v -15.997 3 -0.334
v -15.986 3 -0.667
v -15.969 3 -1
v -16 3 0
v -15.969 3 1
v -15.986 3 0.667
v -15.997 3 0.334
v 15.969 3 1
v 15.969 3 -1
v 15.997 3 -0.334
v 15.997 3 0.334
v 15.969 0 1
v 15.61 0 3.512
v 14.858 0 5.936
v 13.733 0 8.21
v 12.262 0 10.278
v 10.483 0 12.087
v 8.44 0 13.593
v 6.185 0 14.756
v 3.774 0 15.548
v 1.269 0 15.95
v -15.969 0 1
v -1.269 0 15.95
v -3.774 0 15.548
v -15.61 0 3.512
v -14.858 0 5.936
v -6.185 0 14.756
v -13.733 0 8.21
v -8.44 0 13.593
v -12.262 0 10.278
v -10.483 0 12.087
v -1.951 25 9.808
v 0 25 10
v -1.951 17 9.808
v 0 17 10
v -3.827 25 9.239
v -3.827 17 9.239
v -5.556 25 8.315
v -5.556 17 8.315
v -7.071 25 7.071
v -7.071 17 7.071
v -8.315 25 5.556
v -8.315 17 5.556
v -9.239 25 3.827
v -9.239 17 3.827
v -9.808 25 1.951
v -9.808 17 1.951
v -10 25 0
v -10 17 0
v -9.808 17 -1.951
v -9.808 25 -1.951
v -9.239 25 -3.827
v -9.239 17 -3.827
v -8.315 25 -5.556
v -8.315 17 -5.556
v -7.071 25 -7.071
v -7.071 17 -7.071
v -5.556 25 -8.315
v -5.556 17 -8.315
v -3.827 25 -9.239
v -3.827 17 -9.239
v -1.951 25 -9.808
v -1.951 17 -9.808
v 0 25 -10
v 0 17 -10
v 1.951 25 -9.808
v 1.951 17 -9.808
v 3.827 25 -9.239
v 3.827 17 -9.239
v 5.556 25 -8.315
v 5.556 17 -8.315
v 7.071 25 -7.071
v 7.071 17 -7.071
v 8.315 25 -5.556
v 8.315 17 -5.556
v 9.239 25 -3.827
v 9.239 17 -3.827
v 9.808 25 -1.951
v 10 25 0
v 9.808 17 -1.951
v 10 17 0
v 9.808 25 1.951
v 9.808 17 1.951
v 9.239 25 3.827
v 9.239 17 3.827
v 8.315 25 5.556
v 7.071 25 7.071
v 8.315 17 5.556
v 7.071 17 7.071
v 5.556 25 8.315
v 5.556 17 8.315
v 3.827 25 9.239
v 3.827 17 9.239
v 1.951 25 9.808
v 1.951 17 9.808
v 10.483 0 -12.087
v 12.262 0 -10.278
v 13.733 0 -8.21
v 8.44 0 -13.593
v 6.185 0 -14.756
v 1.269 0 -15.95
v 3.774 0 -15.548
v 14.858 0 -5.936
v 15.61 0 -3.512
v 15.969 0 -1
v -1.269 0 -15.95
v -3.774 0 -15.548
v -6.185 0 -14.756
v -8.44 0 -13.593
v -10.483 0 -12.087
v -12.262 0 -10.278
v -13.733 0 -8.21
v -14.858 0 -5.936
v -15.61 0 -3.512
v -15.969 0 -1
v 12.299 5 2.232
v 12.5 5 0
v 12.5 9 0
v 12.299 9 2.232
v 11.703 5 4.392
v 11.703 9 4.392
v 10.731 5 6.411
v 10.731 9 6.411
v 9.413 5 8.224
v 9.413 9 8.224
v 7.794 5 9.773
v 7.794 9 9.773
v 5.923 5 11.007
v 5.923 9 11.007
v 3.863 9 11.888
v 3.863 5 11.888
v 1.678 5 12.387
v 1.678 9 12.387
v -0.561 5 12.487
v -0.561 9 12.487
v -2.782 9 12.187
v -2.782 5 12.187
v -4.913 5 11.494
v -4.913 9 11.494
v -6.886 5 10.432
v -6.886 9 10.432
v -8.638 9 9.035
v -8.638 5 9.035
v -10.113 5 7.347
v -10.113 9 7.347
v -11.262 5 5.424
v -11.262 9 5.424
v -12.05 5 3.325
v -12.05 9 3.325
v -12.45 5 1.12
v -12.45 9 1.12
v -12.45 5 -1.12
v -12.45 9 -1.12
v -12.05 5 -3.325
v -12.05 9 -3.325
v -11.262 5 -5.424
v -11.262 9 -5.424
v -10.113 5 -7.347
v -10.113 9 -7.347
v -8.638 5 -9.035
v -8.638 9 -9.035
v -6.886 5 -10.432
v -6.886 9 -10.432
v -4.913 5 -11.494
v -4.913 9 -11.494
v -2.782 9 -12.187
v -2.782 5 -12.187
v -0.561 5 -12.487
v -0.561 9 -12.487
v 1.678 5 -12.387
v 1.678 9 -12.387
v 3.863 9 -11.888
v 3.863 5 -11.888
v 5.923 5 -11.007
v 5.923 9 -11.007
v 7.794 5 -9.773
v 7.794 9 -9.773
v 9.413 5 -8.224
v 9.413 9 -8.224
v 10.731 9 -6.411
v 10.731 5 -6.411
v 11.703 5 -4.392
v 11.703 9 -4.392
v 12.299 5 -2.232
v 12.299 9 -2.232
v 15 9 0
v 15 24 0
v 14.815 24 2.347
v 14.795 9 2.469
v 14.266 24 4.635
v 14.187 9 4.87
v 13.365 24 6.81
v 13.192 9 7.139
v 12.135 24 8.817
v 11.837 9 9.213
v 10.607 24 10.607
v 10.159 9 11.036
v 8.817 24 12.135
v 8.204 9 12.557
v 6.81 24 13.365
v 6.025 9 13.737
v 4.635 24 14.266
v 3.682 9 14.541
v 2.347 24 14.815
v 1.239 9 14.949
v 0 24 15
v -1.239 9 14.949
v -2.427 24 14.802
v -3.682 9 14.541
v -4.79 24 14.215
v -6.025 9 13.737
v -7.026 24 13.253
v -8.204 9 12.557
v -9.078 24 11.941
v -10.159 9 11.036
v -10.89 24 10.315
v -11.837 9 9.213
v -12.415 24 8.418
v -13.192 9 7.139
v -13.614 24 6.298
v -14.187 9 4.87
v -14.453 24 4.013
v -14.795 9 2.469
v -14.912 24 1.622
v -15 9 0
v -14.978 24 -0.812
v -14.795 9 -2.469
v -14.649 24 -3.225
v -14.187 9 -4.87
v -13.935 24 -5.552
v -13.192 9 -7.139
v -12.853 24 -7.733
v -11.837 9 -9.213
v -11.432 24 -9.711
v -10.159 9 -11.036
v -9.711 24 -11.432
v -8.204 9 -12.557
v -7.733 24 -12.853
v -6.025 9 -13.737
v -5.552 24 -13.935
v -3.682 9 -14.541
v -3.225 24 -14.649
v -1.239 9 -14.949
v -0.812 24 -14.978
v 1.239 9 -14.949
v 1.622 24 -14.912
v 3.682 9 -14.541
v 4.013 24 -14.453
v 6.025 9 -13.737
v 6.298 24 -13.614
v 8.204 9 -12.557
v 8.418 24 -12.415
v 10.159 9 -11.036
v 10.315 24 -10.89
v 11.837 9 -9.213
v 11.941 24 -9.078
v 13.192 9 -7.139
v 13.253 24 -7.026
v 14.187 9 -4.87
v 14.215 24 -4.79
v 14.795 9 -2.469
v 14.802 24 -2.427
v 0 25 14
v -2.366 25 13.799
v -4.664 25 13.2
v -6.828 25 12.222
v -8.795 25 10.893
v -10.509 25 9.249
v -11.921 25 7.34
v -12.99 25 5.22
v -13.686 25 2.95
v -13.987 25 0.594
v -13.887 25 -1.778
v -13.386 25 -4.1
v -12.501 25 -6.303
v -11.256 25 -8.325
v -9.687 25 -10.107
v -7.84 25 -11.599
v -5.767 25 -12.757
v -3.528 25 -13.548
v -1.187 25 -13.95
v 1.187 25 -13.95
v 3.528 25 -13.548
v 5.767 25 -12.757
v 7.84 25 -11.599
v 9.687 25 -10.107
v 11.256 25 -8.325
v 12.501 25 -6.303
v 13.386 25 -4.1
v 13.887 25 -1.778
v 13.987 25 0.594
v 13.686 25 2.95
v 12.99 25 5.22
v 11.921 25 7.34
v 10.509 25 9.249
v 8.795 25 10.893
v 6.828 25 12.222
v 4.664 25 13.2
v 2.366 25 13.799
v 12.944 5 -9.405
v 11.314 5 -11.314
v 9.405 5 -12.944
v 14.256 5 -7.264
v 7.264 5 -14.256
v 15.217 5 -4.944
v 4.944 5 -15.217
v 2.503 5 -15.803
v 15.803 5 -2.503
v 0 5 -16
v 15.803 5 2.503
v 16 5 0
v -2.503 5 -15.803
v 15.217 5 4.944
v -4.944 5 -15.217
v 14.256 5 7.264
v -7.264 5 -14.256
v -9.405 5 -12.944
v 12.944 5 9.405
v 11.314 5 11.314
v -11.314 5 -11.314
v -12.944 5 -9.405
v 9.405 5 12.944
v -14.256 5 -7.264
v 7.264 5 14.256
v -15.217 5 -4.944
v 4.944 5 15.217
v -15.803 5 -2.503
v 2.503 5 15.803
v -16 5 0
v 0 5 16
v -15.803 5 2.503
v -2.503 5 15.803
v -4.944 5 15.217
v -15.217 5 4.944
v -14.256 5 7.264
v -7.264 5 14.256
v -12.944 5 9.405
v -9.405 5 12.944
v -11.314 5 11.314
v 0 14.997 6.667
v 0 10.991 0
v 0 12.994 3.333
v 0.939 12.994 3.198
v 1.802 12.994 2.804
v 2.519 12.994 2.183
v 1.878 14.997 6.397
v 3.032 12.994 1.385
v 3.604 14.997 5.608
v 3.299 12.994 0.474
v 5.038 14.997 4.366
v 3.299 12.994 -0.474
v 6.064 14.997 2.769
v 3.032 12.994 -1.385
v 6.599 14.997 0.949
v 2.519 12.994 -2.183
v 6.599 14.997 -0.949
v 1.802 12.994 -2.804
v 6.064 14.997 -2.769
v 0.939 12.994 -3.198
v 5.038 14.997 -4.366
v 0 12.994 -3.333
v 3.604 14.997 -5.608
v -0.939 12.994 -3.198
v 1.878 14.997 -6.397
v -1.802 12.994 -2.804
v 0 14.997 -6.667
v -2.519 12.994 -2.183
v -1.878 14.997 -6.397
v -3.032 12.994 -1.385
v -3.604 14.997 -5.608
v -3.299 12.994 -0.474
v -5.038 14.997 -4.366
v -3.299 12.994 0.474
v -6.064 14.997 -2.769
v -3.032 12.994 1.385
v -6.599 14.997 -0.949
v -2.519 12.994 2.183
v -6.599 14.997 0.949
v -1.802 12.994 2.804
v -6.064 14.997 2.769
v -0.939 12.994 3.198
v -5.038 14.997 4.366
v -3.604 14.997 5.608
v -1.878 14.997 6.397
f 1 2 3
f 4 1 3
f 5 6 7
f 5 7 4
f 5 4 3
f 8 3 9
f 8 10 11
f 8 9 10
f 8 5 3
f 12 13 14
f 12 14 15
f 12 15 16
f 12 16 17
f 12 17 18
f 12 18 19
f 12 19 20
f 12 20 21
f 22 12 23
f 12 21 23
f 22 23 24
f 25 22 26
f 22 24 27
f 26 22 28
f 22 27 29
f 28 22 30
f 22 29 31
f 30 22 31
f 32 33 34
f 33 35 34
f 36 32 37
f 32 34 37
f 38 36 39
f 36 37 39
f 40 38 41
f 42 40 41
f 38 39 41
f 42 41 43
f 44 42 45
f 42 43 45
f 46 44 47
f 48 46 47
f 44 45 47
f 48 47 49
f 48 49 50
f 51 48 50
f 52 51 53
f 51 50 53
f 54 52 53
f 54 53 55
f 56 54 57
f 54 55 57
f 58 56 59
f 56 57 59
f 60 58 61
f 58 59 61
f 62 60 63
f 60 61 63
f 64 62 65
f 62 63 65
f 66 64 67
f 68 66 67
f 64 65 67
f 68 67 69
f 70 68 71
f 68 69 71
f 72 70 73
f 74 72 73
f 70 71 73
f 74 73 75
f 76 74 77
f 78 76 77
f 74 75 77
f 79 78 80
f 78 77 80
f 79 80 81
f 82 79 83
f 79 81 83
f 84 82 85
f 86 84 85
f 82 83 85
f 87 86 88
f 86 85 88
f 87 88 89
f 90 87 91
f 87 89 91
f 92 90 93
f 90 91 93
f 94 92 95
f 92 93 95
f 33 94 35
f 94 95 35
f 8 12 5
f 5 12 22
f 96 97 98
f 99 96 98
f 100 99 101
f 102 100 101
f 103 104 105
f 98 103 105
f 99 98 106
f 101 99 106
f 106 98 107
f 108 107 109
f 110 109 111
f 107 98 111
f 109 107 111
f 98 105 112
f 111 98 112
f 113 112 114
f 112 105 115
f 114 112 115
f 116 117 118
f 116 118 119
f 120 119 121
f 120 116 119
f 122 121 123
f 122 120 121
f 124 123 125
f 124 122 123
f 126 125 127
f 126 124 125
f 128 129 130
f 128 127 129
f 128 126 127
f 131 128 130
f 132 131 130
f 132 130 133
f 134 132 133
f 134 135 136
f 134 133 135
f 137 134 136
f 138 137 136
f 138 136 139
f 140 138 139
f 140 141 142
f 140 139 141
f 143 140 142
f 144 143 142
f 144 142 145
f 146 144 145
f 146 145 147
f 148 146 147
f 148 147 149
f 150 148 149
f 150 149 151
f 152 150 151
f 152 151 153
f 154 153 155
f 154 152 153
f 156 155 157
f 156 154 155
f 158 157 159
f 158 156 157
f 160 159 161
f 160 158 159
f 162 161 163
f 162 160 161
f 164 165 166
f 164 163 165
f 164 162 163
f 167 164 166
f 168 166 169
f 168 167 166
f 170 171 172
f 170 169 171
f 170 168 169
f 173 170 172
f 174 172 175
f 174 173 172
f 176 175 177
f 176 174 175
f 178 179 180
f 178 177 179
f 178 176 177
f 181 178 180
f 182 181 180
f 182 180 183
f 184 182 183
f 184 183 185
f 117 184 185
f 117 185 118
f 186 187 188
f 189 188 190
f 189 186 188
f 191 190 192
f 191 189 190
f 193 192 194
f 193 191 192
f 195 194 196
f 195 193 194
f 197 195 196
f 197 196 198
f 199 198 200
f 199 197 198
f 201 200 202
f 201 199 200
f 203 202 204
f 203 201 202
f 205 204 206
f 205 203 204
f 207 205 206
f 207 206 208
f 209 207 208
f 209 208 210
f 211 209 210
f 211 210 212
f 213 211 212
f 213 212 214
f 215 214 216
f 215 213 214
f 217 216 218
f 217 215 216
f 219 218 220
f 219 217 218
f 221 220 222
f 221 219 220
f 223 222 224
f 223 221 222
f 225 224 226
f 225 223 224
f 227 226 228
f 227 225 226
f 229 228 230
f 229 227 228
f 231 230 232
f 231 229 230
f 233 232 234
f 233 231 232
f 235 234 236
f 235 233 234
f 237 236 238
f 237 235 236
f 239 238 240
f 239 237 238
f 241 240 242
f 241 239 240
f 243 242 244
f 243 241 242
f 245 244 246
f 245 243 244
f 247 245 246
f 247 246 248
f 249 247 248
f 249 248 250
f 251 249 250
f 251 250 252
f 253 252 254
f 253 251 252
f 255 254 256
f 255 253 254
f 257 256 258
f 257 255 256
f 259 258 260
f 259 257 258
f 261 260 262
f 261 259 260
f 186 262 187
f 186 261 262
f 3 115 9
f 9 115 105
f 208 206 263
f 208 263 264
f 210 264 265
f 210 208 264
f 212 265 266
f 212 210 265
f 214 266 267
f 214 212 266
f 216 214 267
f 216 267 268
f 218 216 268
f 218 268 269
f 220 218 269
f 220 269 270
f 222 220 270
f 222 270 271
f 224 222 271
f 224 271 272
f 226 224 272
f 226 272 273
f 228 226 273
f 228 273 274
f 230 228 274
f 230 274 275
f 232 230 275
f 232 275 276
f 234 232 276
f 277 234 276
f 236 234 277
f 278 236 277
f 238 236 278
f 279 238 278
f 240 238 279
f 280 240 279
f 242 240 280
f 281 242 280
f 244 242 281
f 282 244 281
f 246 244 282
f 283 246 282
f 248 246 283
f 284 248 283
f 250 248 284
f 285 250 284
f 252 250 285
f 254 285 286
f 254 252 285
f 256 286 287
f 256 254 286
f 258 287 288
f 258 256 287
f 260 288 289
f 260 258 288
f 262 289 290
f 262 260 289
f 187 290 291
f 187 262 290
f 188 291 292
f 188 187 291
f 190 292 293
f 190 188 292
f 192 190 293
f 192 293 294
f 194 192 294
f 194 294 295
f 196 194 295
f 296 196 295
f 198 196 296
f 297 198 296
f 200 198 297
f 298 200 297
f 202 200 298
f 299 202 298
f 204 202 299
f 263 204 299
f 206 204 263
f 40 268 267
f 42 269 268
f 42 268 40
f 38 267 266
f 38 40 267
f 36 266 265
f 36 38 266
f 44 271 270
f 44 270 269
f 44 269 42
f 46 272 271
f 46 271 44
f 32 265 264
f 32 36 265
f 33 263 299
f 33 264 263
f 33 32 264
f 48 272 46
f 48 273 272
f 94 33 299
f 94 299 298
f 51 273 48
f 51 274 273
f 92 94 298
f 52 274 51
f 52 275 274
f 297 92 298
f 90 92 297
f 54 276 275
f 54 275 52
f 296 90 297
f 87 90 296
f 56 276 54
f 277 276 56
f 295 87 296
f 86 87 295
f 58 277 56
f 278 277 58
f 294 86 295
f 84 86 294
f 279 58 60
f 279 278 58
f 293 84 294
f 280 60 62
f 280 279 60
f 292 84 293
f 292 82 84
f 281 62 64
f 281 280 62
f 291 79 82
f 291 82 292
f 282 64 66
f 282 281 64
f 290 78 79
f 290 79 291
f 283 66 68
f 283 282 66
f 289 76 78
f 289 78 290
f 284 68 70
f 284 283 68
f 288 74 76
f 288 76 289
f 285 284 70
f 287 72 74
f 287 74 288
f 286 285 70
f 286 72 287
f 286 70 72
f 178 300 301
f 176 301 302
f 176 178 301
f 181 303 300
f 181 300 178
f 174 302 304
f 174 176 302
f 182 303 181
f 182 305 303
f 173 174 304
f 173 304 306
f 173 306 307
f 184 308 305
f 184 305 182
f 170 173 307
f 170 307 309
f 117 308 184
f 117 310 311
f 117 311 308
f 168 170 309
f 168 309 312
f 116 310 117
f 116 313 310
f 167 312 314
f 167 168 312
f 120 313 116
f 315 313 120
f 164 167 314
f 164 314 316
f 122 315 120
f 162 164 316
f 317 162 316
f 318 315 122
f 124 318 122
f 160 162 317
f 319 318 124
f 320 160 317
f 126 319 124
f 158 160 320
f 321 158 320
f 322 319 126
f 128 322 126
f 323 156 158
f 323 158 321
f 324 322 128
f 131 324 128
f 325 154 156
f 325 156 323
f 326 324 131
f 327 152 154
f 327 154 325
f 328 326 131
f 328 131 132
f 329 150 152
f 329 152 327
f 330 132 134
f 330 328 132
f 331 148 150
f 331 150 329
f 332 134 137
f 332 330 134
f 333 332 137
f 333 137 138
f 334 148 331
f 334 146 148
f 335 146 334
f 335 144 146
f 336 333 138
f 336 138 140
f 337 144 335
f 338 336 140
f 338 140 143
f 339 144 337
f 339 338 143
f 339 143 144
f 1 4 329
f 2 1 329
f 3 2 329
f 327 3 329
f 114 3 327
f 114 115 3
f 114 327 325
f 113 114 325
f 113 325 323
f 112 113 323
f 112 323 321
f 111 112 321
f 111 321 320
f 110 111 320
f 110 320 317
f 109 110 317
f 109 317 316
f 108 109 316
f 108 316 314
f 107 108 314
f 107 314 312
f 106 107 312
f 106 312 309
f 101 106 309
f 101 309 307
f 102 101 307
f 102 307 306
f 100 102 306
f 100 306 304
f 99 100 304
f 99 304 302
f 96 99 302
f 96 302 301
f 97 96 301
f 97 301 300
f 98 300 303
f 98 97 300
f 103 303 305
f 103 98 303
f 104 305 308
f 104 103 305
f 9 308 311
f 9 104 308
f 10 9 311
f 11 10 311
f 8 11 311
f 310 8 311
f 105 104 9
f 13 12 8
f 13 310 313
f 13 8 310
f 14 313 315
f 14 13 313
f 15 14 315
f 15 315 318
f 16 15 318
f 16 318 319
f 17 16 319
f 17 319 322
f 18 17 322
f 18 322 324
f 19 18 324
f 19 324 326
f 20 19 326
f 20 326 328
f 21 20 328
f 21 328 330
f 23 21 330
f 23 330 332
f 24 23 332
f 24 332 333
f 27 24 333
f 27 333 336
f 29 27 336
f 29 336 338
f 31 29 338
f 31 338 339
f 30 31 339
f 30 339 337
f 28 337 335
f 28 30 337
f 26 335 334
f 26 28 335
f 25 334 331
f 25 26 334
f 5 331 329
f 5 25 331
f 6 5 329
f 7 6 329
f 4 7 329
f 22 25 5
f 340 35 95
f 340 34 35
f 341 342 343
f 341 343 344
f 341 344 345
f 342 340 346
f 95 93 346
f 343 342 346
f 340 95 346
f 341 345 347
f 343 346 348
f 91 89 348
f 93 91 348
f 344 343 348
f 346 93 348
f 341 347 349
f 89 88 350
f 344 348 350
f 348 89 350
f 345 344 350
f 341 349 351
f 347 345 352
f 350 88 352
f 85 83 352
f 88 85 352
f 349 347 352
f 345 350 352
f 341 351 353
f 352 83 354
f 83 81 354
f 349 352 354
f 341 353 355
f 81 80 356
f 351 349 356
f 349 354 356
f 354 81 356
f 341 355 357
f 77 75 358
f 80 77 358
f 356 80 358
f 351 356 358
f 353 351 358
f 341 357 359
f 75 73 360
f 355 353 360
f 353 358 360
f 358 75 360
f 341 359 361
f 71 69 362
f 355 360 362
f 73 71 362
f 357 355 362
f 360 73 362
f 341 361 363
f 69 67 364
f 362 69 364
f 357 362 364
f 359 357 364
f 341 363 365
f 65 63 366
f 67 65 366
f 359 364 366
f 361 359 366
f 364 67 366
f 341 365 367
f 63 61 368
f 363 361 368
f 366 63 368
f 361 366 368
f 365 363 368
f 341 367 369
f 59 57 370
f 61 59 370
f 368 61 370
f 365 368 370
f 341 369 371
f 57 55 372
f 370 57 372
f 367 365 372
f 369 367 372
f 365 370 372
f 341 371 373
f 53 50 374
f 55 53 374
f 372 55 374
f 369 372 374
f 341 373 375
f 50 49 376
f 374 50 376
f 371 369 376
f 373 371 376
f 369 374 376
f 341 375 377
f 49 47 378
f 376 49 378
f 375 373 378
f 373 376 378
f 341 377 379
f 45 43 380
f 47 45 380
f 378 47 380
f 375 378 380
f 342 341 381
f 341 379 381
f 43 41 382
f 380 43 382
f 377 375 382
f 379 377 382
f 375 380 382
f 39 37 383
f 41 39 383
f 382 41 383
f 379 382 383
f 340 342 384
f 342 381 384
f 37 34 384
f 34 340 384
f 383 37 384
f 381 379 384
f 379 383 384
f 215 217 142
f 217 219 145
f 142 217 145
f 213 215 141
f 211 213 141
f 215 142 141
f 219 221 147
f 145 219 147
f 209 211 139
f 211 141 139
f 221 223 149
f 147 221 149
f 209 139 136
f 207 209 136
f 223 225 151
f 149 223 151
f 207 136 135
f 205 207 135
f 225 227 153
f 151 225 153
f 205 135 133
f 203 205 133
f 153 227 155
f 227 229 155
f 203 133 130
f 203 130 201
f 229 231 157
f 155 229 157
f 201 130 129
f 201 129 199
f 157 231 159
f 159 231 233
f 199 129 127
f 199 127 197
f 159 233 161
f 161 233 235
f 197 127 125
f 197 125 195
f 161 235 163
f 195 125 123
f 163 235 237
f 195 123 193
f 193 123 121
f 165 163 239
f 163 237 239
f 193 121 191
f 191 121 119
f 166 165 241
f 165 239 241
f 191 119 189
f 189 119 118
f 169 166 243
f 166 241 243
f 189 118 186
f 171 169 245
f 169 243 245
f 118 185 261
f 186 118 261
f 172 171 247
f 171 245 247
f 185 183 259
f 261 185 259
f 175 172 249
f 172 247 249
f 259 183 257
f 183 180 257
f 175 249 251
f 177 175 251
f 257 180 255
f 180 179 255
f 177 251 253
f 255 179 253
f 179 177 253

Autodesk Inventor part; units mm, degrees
ref_plane "YZ Plane" through (0, 0, 0) normal (1, 0, 0) x (0, 1, 0)
ref_plane "XZ Plane" through (0, 0, 0) normal (0, 1, 0) x (-1, 0, 0)
ref_plane "XY Plane" through (0, 0, 0) normal (0, 0, 1) x (1, 0, 0)
sketch "草图1" plane through (0, 0, 0) normal (0, 1, 0) x (-1, 0, 0)
  circle A0 centre (0, 0) radius 16
  dimension "d0" = 32
extrude "拉伸1" add sketch "草图1" along normal blind 5
sketch "草图2" plane through (0, 0, 0) normal (0, -1, 0) x (1, 0, 0)
  line L0 (16, 1) -> (-16, 1)
  line L1 (-16, 1) -> (-16, -1)
  line L2 (-16, -1) -> (16, -1)
  line L3 (16, -1) -> (16, 1)
  line L4 (16, 1) -> (-16, -1) construction
  line L5 (-16, 1) -> (16, -1) construction
  point P0 (0, 0)
  dimension "d3" = 32
  dimension "d4" = 2
extrude "拉伸2" cut sketch "草图2" against normal blind 3
sketch "草图3" plane through (0, 5, 0) normal (0, 1, 0) x (1, 0, 0)
  circle A0 centre (0, 0) radius 12.5
  dimension "d7" = 25
extrude "拉伸3" add sketch "草图3" along normal blind 4
sketch "草图4" plane through (0, 9, 0) normal (0, 1, 0) x (1, 0, 0)
  circle A0 centre (0, 0) radius 15
  dimension "d10" = 30
extrude "拉伸4" add sketch "草图4" along normal blind 16
sketch "草图5" plane through (0, 25, 0) normal (0, 1, 0) x (1, 0, 0)
  circle A0 centre (0, 0) radius 10
  dimension "d13" = 20
hole "孔1" at (0, 25, 0) direction (0, -1, 0) diameter 20 depth 8 tip angle 118
sketch "草图6" plane through (0, 0, 0) normal (1, 0, 0) x (0, 1, 0)
  line L0 (9, 15) -> (25, 15) projected
  line L1 (24, 15) -> (25, 14)
  line L2 (25, -15) -> (25, 15) projected
  line L3 (-5, 0) -> (30, 0) projected
  point P0 (0, 0)
  dimension "d21" = 1
  dimension "d22" = 45
revolve "旋转1" cut sketch "草图6" angle 360 about axis through (0, -10, 0) along (0, 1, 0)
thread "螺纹1" size "M30x3.5" designation "M30" class "6g" standard "GB Metric profile" length 48
properties part number "2-螺塞" material "不锈钢"
